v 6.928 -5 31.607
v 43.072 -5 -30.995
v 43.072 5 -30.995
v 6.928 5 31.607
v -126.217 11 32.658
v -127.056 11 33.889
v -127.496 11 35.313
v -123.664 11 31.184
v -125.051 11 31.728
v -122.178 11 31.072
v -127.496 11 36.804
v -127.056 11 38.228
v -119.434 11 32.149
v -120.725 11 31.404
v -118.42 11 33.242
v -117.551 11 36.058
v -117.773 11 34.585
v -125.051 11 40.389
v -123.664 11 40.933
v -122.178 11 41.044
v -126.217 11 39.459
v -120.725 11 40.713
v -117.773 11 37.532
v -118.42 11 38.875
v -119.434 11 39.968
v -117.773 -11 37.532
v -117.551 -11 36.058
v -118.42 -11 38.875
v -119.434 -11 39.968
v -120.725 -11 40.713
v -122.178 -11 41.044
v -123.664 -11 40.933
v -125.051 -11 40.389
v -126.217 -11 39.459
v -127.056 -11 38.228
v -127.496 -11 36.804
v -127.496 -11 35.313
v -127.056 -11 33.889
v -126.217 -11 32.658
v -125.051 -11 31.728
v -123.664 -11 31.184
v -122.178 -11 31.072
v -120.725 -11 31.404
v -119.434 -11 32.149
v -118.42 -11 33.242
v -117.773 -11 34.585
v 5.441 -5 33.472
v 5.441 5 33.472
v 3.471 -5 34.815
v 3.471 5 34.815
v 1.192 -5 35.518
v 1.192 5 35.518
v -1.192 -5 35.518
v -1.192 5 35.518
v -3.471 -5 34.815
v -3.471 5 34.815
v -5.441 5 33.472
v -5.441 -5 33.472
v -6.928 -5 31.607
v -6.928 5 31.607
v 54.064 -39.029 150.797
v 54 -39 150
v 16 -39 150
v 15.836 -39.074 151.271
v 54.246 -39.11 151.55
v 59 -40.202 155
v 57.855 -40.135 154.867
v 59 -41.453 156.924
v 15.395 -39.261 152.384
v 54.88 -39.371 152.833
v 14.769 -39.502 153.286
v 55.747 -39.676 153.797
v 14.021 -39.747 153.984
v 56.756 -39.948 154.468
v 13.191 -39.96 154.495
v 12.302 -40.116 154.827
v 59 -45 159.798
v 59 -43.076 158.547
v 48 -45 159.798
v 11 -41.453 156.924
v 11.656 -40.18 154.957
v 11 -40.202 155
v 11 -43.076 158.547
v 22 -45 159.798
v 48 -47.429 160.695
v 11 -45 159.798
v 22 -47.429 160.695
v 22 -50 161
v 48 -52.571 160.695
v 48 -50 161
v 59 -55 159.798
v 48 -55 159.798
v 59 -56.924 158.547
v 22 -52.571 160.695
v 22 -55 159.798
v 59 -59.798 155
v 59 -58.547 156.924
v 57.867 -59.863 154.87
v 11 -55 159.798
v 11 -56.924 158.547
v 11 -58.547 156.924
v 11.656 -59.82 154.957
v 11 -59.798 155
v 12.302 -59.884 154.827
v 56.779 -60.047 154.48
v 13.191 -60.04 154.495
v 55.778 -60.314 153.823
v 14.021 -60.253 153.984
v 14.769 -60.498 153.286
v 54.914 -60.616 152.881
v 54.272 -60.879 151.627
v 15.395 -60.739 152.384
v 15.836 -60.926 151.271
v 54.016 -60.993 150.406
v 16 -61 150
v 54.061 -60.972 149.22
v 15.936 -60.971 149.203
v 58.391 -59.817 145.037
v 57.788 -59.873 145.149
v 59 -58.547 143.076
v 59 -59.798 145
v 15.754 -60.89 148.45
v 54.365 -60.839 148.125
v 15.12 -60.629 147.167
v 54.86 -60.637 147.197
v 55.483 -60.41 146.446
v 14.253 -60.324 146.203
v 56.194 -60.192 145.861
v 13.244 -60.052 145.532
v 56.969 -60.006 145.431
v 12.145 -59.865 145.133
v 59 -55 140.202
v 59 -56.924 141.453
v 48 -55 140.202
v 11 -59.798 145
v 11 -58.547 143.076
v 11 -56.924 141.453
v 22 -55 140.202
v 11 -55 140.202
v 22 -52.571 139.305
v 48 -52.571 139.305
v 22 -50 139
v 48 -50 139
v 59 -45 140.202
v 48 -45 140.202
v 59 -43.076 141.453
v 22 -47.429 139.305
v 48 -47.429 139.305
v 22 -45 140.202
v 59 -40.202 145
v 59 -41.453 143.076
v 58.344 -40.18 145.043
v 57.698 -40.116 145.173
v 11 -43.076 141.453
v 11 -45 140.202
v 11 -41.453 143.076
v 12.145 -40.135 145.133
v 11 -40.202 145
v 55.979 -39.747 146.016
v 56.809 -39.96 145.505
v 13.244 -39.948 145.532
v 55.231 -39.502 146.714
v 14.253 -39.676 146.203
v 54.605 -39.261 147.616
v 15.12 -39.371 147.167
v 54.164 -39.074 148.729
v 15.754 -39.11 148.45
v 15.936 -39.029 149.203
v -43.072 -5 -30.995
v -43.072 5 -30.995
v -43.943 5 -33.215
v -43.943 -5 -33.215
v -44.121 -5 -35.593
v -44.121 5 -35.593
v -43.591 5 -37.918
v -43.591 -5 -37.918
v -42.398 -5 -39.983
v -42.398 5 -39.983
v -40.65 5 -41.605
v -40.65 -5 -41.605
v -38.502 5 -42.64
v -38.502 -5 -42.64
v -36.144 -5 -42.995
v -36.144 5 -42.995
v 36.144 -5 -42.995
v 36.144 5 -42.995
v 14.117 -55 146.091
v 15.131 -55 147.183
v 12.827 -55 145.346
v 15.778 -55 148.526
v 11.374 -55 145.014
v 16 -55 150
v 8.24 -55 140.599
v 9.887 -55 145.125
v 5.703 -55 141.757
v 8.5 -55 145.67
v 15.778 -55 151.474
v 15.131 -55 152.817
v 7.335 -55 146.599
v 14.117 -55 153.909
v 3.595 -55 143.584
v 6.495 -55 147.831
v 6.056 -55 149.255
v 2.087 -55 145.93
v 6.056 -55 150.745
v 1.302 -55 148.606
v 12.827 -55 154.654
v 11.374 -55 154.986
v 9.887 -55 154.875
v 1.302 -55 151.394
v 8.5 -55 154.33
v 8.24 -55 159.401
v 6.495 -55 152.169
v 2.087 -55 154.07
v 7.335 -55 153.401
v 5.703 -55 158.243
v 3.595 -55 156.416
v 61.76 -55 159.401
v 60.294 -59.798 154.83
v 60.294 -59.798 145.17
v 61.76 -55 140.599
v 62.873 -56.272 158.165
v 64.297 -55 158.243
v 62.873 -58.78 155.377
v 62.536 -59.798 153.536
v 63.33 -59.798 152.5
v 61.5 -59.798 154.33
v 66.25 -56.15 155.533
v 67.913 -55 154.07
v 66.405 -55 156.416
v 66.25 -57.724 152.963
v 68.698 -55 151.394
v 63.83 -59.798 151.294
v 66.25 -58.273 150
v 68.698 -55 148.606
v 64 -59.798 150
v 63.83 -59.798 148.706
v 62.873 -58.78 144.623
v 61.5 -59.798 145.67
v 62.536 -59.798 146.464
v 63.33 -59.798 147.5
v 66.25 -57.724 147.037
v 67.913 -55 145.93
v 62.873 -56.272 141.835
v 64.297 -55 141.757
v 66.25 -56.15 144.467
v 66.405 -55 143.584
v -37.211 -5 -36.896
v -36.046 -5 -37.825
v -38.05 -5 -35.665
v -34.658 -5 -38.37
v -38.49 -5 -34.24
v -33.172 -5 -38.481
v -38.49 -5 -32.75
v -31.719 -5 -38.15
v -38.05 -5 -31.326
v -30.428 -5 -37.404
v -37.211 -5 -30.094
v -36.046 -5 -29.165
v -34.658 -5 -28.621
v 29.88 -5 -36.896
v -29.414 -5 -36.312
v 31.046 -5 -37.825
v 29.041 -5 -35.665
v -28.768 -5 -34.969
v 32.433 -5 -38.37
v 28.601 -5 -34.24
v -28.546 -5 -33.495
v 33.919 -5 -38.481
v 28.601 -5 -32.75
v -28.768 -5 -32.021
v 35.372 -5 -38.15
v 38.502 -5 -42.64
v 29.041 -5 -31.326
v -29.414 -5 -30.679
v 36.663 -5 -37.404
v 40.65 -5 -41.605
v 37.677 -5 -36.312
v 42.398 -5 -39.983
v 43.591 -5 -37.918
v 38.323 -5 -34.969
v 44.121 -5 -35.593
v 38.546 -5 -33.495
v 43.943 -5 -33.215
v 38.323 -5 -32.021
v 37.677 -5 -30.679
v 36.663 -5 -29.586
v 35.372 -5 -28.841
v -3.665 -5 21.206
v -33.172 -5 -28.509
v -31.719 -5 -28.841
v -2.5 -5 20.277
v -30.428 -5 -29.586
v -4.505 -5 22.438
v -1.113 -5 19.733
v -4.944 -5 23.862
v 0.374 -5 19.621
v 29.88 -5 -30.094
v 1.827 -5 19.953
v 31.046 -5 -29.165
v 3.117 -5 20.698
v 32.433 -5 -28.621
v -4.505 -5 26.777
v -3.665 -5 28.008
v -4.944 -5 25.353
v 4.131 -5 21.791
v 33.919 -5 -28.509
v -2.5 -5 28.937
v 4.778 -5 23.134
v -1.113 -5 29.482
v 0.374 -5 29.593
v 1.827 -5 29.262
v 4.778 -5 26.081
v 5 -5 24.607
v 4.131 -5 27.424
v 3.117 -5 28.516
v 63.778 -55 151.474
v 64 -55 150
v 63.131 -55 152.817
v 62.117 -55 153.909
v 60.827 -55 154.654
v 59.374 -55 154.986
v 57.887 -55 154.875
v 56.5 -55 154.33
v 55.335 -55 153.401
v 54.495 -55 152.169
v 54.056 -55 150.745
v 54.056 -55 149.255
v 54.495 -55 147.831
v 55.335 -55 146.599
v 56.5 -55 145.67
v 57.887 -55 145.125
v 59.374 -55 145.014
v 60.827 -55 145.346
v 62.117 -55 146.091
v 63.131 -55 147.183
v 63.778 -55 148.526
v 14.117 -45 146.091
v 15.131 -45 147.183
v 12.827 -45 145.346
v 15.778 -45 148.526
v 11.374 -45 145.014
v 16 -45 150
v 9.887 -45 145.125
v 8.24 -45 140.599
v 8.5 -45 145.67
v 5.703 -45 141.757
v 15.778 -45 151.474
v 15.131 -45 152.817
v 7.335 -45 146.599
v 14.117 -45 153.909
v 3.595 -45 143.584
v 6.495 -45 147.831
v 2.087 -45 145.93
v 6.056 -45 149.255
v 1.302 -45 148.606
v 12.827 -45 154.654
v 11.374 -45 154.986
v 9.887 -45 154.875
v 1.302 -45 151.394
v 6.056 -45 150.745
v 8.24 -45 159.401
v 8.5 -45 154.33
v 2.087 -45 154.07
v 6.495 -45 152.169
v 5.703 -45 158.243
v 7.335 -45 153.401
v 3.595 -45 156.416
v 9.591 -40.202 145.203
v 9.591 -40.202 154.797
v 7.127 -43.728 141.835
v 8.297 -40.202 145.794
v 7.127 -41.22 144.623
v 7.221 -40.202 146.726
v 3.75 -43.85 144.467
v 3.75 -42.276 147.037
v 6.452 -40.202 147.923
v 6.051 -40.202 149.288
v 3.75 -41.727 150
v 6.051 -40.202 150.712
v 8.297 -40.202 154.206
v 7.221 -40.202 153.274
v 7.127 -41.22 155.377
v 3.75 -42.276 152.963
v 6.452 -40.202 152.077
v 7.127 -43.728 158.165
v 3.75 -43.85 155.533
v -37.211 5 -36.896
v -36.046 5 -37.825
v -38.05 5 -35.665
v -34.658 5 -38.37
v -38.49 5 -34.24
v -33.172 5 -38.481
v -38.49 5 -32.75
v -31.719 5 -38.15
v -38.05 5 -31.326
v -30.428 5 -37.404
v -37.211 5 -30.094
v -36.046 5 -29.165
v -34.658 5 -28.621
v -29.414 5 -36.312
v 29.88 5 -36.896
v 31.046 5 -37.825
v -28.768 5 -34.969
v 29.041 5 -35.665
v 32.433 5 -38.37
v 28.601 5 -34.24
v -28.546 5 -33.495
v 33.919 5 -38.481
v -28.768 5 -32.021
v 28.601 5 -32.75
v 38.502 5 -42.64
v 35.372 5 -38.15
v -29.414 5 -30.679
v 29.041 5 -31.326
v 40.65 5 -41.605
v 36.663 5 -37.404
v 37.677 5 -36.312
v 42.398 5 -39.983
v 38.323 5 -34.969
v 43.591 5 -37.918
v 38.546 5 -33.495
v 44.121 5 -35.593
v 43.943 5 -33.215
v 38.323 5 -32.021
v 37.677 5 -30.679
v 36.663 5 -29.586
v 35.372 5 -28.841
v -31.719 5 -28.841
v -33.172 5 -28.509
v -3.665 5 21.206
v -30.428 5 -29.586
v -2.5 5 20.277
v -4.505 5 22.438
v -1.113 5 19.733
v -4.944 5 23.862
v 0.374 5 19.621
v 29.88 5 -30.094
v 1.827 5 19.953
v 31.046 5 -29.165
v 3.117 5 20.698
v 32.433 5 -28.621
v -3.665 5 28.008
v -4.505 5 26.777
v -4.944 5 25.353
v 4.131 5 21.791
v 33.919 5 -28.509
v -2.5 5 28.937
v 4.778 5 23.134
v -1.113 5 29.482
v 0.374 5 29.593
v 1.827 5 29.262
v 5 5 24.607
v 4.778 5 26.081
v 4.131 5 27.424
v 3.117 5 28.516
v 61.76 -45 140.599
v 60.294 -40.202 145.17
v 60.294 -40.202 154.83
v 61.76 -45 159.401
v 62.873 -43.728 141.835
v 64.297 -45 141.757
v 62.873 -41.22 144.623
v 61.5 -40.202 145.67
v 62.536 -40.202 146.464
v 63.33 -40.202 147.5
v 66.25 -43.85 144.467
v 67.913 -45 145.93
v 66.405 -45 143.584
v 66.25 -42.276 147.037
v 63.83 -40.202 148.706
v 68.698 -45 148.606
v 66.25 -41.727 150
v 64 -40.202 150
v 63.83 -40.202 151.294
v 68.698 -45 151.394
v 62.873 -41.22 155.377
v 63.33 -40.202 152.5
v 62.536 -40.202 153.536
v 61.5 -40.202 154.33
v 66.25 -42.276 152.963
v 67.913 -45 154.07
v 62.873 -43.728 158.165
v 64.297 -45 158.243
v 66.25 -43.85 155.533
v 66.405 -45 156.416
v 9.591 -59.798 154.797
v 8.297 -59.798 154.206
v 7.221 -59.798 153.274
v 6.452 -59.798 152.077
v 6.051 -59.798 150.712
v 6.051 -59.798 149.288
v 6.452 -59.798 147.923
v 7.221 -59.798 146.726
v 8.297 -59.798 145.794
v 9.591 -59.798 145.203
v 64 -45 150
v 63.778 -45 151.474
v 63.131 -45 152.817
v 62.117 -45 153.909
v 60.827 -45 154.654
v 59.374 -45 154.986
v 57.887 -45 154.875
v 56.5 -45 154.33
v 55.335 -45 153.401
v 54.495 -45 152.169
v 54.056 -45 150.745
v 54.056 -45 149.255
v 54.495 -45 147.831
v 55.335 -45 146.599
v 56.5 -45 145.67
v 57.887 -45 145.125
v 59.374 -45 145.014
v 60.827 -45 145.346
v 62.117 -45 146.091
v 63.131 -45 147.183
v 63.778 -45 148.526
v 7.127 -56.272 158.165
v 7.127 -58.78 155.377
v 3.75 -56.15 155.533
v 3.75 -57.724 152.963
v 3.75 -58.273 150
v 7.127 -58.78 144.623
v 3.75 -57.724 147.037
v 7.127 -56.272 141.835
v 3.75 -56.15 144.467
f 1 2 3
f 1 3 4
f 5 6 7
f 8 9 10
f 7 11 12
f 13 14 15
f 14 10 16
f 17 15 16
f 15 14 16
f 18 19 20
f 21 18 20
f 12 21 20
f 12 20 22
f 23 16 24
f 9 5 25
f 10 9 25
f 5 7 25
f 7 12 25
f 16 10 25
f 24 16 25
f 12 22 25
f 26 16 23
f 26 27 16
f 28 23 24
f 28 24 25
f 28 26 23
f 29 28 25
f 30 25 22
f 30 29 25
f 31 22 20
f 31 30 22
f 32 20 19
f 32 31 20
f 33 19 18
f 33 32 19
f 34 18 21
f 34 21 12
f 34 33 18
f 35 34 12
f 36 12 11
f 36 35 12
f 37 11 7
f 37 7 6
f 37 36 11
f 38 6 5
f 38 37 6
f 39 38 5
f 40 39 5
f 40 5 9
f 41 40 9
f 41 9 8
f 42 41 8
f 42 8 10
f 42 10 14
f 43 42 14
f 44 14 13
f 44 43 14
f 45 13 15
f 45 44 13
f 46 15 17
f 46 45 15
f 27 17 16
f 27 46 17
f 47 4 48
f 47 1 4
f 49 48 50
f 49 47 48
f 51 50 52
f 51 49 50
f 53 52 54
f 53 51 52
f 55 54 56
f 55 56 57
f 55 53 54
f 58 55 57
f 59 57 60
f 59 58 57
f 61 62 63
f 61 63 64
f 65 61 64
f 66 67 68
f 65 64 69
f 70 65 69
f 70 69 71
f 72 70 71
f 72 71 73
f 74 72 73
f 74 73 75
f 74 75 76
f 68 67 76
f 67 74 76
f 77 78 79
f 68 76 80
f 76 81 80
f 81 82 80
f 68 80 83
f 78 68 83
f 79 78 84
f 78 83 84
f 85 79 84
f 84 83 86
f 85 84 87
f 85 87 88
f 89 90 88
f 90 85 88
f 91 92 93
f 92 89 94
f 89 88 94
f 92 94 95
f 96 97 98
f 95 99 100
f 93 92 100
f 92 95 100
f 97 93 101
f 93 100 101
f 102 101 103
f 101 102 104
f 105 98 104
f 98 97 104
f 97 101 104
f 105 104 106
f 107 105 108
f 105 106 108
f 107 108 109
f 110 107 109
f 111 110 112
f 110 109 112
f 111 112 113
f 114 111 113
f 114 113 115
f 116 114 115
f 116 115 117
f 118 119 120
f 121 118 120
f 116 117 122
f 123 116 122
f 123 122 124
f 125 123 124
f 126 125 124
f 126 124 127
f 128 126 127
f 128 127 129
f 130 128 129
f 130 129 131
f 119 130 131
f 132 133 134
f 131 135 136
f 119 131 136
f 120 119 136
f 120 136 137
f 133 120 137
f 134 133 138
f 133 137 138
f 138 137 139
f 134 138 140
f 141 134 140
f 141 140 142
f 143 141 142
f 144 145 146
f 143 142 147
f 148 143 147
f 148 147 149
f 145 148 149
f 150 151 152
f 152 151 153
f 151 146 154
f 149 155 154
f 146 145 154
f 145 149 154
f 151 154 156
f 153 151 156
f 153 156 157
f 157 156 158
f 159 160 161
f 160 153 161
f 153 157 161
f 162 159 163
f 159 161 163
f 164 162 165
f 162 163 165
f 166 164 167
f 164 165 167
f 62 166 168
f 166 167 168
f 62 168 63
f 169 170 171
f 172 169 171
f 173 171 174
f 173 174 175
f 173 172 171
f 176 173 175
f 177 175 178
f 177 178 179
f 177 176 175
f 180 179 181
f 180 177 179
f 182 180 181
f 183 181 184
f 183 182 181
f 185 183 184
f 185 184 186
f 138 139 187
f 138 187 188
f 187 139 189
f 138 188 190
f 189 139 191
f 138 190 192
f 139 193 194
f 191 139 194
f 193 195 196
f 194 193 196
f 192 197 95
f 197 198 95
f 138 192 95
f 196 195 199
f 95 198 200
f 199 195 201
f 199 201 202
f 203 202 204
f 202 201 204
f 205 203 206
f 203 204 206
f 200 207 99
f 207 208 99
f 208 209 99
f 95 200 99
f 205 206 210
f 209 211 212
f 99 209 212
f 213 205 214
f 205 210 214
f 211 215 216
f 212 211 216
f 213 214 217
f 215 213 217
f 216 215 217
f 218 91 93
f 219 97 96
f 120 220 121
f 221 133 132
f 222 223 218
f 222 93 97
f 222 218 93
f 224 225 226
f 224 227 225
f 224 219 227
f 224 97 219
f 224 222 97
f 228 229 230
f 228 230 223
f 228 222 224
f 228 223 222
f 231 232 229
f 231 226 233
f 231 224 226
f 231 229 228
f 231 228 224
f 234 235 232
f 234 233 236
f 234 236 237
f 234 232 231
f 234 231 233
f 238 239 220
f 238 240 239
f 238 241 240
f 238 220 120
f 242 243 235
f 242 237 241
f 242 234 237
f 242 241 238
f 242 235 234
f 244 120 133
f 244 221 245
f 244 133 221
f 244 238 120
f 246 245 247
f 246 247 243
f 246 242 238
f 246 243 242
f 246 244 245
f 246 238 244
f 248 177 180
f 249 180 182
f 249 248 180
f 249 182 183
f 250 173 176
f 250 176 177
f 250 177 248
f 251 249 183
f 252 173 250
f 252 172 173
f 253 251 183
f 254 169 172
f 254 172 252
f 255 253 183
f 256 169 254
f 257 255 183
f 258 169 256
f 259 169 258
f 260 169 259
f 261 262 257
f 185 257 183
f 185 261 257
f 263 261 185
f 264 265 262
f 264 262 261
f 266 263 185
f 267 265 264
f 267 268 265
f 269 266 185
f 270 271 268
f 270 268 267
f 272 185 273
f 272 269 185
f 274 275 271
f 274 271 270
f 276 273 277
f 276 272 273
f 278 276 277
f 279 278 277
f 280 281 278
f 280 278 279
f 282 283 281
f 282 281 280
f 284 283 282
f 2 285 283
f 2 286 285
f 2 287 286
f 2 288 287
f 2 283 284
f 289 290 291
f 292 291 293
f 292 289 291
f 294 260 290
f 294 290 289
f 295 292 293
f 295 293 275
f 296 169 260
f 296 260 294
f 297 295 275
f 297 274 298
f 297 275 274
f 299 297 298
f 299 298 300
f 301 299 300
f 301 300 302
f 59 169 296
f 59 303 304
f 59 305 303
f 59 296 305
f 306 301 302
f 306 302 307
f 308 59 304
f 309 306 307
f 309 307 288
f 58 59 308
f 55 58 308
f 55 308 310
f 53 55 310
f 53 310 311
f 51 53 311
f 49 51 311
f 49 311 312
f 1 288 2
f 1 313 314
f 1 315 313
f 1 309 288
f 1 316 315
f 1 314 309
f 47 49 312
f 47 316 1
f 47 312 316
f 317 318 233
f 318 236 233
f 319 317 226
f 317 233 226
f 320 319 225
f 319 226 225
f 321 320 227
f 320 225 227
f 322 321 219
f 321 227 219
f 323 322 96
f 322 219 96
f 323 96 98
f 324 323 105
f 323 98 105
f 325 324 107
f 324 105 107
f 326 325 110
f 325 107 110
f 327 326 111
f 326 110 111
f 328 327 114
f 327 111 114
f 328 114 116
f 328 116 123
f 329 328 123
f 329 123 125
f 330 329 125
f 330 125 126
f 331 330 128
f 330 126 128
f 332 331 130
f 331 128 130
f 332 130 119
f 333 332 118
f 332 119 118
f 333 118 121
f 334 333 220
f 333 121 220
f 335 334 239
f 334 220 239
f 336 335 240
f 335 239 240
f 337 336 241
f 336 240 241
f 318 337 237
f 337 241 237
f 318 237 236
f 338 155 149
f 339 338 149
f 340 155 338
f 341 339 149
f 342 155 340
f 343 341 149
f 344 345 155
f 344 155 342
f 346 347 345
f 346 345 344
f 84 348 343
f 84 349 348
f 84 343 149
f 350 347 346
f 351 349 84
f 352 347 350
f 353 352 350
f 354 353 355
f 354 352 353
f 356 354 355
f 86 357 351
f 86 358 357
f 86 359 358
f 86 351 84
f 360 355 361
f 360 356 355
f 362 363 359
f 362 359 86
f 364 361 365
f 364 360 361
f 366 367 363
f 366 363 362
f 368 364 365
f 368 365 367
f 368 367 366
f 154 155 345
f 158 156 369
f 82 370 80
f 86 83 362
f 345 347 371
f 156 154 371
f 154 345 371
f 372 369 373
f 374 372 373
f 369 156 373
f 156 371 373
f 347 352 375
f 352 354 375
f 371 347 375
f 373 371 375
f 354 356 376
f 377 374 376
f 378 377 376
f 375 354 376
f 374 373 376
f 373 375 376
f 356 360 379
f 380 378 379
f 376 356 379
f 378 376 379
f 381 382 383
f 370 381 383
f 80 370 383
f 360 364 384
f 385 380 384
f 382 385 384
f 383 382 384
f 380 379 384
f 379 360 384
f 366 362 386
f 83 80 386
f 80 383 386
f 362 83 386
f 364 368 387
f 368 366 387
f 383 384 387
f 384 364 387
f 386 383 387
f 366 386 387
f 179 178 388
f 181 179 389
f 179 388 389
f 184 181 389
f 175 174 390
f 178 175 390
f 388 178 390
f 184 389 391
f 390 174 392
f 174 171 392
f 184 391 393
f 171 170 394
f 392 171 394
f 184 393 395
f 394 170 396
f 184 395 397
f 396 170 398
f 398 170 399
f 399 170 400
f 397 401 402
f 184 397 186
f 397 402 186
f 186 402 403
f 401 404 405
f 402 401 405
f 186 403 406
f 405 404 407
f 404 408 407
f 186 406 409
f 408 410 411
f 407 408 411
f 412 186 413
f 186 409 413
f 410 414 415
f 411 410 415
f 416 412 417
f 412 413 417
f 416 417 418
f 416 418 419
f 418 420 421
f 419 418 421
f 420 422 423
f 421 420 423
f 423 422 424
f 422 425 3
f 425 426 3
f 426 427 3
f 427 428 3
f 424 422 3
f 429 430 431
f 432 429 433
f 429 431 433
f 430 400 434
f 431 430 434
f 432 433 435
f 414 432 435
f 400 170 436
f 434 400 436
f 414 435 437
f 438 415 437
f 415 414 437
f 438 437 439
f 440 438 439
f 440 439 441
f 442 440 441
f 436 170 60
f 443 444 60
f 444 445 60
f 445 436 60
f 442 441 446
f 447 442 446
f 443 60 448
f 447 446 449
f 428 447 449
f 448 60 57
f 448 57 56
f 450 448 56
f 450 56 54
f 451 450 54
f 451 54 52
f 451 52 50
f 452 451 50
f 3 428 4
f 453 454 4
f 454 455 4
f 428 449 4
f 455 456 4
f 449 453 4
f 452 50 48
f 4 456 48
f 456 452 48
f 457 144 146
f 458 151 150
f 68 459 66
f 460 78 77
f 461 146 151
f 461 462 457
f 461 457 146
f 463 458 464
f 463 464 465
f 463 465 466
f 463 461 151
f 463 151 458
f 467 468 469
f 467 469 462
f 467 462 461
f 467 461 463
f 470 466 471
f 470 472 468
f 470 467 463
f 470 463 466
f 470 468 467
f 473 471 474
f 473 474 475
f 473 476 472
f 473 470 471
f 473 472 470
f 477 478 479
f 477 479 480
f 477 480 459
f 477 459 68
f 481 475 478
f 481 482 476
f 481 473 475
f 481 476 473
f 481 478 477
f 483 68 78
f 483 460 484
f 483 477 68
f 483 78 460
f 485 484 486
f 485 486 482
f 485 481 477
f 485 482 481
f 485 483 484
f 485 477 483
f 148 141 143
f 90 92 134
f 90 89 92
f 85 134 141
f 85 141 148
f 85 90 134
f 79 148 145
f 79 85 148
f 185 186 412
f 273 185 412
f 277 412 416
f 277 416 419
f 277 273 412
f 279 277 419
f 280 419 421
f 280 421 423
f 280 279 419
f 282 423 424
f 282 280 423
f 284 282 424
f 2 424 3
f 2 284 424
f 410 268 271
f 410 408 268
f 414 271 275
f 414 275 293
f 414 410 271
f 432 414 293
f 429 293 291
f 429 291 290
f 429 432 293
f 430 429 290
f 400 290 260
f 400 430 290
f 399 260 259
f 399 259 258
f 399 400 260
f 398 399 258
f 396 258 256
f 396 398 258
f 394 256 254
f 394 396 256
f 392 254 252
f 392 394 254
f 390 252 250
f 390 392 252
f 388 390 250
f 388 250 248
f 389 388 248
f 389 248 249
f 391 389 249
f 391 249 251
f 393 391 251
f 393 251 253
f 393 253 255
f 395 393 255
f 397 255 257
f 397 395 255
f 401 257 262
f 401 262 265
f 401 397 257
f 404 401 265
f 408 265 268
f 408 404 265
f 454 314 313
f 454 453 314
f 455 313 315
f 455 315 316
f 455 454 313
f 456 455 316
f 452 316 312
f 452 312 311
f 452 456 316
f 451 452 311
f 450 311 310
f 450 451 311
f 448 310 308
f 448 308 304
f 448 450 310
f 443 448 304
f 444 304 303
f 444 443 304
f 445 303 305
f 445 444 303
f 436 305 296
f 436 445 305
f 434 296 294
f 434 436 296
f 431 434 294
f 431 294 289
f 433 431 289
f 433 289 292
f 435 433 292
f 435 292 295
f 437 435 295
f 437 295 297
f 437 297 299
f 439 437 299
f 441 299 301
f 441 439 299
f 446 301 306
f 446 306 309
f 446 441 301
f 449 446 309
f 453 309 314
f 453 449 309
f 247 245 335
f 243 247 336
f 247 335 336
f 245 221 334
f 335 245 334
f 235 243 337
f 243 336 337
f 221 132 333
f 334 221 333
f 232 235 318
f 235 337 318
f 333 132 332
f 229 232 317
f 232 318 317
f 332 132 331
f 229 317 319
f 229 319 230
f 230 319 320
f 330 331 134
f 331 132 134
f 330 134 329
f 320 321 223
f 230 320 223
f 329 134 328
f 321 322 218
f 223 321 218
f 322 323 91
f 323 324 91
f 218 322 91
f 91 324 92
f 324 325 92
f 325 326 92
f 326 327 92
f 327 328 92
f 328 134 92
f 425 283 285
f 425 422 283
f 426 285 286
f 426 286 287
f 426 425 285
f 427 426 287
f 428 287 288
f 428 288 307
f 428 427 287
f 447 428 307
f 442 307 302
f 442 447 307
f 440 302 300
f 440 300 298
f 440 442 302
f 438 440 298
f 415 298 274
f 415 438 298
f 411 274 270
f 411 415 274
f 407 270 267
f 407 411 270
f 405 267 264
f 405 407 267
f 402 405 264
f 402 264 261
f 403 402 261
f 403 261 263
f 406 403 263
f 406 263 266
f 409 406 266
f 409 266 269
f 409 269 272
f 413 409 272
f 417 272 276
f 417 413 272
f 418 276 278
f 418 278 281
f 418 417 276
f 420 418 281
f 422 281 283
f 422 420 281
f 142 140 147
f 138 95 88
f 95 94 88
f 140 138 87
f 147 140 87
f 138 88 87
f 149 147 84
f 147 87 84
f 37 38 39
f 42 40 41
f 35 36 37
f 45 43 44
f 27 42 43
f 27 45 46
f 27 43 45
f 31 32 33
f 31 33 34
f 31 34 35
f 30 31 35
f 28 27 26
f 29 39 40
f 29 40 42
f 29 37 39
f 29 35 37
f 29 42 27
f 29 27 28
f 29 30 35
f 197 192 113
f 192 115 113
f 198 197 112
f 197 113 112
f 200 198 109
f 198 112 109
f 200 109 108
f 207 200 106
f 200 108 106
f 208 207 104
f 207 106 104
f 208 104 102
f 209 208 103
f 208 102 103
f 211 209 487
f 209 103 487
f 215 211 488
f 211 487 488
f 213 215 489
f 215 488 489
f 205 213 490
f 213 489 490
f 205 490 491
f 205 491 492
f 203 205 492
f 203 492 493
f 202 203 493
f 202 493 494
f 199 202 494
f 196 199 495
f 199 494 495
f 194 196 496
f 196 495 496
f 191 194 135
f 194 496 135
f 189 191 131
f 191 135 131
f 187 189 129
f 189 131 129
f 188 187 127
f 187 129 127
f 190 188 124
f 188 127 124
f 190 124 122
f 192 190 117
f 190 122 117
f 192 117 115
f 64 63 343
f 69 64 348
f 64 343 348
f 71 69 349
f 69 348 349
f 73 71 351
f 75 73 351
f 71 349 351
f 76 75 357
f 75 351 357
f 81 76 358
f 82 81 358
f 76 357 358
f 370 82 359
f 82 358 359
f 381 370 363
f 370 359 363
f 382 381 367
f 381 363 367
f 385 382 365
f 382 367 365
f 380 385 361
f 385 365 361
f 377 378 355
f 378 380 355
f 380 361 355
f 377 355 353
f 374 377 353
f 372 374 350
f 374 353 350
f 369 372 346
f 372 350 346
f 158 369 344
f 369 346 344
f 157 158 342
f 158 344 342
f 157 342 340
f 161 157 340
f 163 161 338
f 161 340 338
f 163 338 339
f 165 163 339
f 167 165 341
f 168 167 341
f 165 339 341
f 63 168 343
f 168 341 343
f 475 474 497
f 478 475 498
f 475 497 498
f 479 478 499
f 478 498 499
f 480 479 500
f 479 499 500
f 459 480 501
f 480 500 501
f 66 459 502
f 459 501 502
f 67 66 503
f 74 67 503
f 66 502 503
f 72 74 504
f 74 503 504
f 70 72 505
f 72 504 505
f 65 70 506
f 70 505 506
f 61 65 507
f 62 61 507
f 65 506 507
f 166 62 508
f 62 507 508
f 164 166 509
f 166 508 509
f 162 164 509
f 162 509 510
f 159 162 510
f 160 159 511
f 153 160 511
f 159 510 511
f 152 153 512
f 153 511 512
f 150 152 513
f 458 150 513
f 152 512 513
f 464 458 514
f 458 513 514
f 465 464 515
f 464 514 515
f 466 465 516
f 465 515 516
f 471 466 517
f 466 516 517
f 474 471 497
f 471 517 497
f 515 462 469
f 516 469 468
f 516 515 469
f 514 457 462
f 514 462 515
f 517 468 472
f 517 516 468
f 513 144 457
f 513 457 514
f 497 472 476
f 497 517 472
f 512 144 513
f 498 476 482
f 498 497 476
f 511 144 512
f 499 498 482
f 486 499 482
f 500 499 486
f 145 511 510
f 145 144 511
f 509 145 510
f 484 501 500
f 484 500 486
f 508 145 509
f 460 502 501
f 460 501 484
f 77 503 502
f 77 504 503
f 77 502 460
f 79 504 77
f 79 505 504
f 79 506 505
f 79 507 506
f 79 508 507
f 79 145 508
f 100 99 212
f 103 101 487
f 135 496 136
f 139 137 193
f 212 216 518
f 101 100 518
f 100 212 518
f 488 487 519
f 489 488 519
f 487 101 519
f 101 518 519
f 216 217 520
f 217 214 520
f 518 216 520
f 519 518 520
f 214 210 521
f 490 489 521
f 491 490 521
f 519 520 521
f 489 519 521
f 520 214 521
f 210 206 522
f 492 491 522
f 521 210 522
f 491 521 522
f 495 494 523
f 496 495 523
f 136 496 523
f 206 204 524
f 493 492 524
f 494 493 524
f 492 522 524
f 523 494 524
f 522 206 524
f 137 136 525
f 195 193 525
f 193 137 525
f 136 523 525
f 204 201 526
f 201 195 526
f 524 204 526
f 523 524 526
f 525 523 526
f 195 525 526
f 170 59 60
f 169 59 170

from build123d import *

# Parameters (mm, degrees)
F0_R      = 5
F1_DEPTH  = 5
F2_R      = 11
F3_DEPTH  = 70
F4_R      = 11
F5_R      = 5
F6_DEPTH  = 12.5
F12_W     = 10
F12_H     = 26.94445
F13_DEPTH = 22
F16_R     = 5
F17_DEPTH = 11


with BuildPart() as f1:
    # F0 (on Front) → F1 (new body, symmetric)
    with BuildSketch(Plane.XZ):
        with BuildLine():
            ThreePointArc((-43.071797, -30.995233), (-43.071797, -38.995233), (-36.143594, -42.995233))
            Line((-36.143594, -42.995233), (36.143594, -42.995233))
            ThreePointArc((36.143594, -42.995233), (43.071797, -38.995233), (43.071797, -30.995233))
            Line((43.071797, -30.995233), (6.928203, 31.607308))
            ThreePointArc((6.928203, 31.607308), (0, 35.607308), (-6.928203, 31.607308))
            Line((-6.928203, 31.607308), (-43.071797, -30.995233))
        make_face()
        with Locations((-33.545517, -33.495233)):
            Circle(F0_R, mode=Mode.SUBTRACT)
        with Locations((33.545517, -33.495233)):
            Circle(F0_R, mode=Mode.SUBTRACT)
        with Locations((0, 24.607308)):
            Circle(F0_R, mode=Mode.SUBTRACT)
    extrude(amount=F1_DEPTH, both=True)


with BuildPart() as f3:
    # F2 (on Right) → F3 (new body)
    with BuildSketch(Plane.YZ):
        with Locations((-50, 150)):
            Circle(F2_R)
    extrude(amount=F3_DEPTH)

    # F4
    f4_edges = [f3.edges().sort_by_distance(p)[0] for p in [
        (70, -61, 150),
        (0, -61, 150),
    ]]
    fillet(f4_edges, radius=F4_R)


with BuildPart() as f6:
    # F5 (on Front) → F6 (new body, symmetric)
    with BuildSketch(Plane.XZ):
        with Locations((11, 150)):
            Circle(F5_R)
    extrude(amount=F6_DEPTH, both=True)


with BuildPart() as f7_1:
    # F7: copy of F6
    add(f6.part)


with BuildPart() as f6_1:
    # F9: moved
    add(f6.part.moved(Location((0, -50, 0))))


with BuildPart() as f10_1:
    # F10: copy of F6
    add(f6_1.part.moved(Location((48, 0, 0))))


with BuildPart() as f3_1:
    add(f3.part)

    # F11: cut F6, F10_1
    add(f6_1.part, mode=Mode.SUBTRACT)
    add(f10_1.part, mode=Mode.SUBTRACT)


with BuildPart() as f13:
    # F12 (on Right) → F13 (new body)
    with BuildSketch(Plane.YZ):
        with Locations((-50, 150)):
            Rectangle(F12_W, F12_H)
    extrude(amount=F13_DEPTH)


with BuildPart() as f14_1:
    # F14: copy of F13
    add(f13.part.moved(Location((48, 0, 0))))


with BuildPart() as f3_2:
    add(f3_1.part)

    # F15: cut F13, F14_1
    add(f13.part, mode=Mode.SUBTRACT)
    add(f14_1.part, mode=Mode.SUBTRACT)


with BuildPart() as f17:
    # F16 (on Front) → F17 (new body, symmetric)
    with BuildSketch(Plane.XZ):
        with Locations((-122.551352, 36.058377)):
            Circle(F16_R)
    extrude(amount=F17_DEPTH, both=True)


solid = Compound([f1.part, f3_2.part, f17.part])
